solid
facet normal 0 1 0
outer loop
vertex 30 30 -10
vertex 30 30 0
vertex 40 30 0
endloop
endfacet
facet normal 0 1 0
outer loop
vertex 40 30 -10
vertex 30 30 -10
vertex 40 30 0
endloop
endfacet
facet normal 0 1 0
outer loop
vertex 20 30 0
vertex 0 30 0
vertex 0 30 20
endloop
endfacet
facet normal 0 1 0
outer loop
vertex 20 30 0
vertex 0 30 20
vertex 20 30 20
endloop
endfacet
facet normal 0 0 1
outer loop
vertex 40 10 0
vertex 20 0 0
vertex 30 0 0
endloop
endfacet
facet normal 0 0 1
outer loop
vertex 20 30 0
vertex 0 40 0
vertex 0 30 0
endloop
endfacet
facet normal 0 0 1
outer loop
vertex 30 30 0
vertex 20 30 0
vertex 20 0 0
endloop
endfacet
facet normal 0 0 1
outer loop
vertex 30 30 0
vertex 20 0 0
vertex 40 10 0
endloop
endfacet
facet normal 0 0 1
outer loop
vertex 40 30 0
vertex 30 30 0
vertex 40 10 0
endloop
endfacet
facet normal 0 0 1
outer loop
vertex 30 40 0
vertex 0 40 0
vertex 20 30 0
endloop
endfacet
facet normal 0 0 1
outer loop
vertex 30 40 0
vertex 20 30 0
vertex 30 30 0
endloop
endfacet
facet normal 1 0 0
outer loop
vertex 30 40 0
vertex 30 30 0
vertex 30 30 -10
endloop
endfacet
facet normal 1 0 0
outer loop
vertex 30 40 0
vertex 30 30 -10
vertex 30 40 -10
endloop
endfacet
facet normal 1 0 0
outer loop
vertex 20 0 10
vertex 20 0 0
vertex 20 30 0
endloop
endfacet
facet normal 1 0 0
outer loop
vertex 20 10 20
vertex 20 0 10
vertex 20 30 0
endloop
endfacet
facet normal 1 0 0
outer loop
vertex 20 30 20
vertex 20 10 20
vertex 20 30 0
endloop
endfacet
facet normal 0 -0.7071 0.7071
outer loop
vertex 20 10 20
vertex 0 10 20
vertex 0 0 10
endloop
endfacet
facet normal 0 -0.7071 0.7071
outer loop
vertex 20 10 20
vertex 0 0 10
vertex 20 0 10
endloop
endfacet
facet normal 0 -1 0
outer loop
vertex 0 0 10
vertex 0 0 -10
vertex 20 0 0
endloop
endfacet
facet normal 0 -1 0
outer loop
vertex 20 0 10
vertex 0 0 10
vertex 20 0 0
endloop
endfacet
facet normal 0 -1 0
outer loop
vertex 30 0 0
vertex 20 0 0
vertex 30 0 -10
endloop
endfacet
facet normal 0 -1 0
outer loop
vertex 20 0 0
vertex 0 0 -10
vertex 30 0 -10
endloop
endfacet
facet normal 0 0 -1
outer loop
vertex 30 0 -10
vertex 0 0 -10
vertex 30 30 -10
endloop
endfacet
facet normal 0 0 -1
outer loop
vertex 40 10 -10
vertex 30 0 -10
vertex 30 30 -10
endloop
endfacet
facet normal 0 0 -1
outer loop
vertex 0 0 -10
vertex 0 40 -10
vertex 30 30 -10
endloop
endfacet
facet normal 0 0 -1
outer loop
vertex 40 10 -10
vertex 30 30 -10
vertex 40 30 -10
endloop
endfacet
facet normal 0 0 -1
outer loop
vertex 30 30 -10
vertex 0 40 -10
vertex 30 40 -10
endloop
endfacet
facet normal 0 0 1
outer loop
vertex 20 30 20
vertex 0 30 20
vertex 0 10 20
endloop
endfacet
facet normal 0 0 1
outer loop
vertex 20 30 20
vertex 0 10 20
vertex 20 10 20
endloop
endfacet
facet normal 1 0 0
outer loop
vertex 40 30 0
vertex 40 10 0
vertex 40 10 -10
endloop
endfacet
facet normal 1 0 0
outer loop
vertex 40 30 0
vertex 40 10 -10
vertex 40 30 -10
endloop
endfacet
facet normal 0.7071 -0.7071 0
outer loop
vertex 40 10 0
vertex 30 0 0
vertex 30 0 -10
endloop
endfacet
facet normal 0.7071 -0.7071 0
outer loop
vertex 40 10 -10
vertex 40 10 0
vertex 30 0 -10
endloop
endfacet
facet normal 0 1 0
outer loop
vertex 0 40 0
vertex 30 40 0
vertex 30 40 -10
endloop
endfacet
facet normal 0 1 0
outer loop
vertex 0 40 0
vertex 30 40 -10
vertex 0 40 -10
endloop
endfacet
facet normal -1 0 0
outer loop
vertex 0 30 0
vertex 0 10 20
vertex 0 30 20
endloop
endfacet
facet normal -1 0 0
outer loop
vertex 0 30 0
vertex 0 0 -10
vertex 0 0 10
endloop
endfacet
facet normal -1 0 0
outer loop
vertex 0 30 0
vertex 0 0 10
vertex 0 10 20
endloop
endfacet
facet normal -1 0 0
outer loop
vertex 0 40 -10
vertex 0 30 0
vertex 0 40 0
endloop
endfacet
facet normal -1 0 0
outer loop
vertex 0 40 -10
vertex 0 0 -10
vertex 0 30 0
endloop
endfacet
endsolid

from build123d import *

# Parameters (mm, degrees)
F0_W     = 20
F0_H     = 30
F0_W_2   = 10
F1_DEPTH = 10
F2_DEPTH = 20
F3_SIZE2 = 10
F3_SIZE  = 10
F4_SIZE2 = 10
F4_SIZE  = 10


with BuildPart() as f1:
    # F0 (on Top) → F1 (new body)
    with BuildSketch(Plane.XY):
        with Locations((10, 15)):
            Rectangle(F0_W, F0_H)
        Polygon((20, 30), (20, 0), (30, 0), (30, 30), (30, 40), (0, 40), (0, 30), align=None)
        with Locations((35, 15)):
            Rectangle(F0_W_2, F0_H)
    extrude(amount=-F1_DEPTH)

    # F0 (on Top) → F2 (join)
    with BuildSketch(Plane.XY):
        with Locations((10, 15)):
            Rectangle(F0_W, F0_H)
    extrude(amount=F2_DEPTH)

    # F3
    f3_edges = [f1.edges().sort_by_distance(p)[0] for p in [
        (10, 0, 20),
    ]]
    chamfer(f3_edges, length=F3_SIZE, length2=F3_SIZE2)

    # F4
    f4_edges = [f1.edges().sort_by_distance(p)[0] for p in [
        (40, 0, -5),
    ]]
    chamfer(f4_edges, length=F4_SIZE, length2=F4_SIZE2)


solid = f1.part
